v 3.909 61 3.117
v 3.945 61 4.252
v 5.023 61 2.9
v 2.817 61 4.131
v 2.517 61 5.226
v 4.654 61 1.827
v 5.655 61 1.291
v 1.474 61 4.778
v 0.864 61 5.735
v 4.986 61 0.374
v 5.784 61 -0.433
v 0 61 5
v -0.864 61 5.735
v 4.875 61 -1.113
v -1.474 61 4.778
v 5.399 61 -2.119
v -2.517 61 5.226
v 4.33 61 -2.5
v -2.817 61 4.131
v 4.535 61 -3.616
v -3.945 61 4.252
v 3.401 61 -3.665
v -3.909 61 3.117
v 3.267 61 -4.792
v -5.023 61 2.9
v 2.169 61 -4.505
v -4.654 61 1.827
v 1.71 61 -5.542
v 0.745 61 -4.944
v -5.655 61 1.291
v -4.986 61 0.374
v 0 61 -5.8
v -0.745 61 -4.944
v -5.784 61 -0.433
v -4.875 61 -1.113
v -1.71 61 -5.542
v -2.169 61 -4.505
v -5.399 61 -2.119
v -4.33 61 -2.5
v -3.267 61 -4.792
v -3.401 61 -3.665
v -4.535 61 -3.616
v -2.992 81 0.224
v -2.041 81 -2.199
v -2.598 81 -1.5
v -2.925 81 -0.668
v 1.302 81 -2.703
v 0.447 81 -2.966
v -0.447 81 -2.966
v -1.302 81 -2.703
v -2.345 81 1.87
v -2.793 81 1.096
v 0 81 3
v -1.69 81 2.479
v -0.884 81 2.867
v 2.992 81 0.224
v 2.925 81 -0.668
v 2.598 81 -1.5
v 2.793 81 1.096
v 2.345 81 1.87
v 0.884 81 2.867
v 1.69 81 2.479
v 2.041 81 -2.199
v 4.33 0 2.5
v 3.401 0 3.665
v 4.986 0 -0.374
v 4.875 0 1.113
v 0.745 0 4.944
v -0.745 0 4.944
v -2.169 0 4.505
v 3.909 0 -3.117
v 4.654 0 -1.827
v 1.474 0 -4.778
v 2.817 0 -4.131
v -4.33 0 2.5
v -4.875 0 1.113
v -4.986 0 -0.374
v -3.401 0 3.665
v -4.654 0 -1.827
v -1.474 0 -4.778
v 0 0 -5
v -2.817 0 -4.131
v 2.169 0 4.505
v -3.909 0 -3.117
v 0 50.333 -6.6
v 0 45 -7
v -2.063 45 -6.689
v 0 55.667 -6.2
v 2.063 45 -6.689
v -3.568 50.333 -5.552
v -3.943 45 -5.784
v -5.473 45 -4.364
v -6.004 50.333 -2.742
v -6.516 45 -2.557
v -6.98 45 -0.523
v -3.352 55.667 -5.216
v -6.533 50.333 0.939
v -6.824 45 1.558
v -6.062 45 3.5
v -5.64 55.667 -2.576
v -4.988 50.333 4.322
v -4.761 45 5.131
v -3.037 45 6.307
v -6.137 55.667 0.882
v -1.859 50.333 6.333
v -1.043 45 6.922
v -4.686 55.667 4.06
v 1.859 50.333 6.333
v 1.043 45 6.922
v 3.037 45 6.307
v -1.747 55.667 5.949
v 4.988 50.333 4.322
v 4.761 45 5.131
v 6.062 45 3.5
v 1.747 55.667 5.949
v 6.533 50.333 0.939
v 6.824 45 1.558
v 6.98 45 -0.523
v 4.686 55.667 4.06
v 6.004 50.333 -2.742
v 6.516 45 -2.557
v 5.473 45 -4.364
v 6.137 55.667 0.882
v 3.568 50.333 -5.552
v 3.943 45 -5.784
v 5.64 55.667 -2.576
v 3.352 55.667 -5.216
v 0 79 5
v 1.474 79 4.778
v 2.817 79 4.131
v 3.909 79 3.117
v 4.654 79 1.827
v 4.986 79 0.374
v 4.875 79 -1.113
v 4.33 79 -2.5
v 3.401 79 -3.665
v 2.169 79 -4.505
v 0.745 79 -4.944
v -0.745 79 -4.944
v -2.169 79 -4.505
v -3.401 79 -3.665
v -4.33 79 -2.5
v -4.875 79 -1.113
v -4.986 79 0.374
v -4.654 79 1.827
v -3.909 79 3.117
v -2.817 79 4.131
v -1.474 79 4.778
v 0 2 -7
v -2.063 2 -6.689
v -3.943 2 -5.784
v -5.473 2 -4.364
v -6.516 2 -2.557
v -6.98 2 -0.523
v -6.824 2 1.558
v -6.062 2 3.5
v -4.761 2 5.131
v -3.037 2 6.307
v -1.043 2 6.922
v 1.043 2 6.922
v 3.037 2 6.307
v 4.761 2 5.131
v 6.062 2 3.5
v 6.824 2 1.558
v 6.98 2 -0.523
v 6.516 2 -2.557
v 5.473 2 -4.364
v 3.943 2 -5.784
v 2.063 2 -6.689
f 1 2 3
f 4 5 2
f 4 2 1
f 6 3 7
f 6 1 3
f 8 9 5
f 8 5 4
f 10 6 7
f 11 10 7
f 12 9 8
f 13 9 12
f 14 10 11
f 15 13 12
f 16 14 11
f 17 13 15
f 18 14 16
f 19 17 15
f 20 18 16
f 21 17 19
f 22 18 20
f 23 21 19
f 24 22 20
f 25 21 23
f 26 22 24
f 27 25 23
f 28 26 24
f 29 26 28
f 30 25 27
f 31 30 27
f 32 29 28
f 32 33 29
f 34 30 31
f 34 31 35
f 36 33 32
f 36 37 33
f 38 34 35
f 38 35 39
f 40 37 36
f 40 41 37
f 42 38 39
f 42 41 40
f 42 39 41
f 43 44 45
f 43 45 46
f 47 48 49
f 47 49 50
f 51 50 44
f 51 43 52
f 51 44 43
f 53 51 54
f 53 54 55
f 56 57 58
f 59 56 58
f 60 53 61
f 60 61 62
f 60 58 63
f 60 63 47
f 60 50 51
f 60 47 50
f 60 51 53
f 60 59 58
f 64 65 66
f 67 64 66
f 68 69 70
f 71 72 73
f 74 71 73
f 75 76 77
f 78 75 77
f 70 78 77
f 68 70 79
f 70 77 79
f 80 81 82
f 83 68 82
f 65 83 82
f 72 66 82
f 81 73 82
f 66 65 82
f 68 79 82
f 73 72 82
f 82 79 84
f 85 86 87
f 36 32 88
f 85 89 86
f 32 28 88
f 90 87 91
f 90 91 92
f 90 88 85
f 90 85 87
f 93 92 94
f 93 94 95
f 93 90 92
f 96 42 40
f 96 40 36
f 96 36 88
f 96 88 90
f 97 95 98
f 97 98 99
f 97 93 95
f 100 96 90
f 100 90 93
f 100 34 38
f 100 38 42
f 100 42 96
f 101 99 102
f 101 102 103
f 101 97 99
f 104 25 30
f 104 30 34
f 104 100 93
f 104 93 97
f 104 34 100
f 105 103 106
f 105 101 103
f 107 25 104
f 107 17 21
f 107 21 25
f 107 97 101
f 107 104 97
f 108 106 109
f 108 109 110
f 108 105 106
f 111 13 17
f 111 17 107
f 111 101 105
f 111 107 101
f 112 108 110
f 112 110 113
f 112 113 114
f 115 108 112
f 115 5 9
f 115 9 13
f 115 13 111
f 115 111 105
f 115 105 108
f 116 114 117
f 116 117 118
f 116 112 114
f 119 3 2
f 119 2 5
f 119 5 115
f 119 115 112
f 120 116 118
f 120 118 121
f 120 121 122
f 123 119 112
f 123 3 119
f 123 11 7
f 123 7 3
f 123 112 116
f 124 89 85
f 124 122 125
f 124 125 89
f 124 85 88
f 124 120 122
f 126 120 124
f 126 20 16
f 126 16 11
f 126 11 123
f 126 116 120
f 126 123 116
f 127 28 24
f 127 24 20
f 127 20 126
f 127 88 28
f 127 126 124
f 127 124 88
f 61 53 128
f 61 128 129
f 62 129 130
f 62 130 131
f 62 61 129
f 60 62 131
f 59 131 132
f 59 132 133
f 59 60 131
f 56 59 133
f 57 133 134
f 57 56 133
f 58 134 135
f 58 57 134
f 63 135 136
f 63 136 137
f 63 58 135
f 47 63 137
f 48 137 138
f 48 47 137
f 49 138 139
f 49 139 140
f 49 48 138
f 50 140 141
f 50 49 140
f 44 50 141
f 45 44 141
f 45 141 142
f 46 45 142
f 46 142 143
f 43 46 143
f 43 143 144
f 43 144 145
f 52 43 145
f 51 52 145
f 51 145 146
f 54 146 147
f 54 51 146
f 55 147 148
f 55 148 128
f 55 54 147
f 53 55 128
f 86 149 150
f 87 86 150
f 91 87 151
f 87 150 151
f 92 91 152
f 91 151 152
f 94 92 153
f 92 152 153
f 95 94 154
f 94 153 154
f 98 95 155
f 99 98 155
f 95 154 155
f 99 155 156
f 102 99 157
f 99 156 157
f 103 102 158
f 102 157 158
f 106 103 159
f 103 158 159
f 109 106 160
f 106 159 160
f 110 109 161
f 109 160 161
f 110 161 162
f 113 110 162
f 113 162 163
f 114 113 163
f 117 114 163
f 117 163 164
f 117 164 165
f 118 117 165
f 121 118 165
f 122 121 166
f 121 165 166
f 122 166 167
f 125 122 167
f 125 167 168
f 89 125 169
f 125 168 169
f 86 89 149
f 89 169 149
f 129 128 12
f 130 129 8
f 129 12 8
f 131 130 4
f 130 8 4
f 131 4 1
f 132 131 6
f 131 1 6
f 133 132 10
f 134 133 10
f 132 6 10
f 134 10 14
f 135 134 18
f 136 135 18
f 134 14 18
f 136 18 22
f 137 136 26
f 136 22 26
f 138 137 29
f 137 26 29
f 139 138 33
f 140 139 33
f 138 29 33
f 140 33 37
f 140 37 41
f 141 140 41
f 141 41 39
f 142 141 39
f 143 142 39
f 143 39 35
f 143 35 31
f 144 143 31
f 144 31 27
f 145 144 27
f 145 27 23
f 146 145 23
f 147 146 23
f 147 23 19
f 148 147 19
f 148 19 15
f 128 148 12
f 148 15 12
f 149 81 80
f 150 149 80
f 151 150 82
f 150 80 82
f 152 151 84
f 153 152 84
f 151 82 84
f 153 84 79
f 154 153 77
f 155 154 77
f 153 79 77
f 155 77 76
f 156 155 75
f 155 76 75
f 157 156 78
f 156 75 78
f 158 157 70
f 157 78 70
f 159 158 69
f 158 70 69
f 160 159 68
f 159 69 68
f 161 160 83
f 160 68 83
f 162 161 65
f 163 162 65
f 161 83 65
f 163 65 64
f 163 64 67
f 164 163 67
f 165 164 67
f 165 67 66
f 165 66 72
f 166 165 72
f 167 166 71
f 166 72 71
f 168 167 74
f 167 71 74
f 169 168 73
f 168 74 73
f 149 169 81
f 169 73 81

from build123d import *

# Parameters (mm, degrees)
SKETCH2_R           = 7
BOSS_EXTRUDE1_DEPTH = 45
SKETCH3_R           = 7
BOSS_EXTRUDE2_DEPTH = 16
BOSS_EXTRUDE2_TAPER = 4.289
SKETCH4_R           = 5
BOSS_EXTRUDE3_DEPTH = 20
CHAMFER1_SIZE       = 2


with BuildPart() as part:
    # Sketch2 → Boss-Extrude1 (new body)
    with BuildSketch(Plane(origin=(0, 0, 0), x_dir=(1, 0, 0), z_dir=(0, 1, 0))):
        with Locations(Location((0, 0, 0), (0, 0, 90))):
            Circle(SKETCH2_R)
    extrude(amount=BOSS_EXTRUDE1_DEPTH)

    # Sketch3 → Boss-Extrude2 (add)
    with BuildSketch(Plane(origin=(0, 45, 0), x_dir=(1, 0, 0), z_dir=(0, 1, 0))):
        with Locations(Location((0, 0, 0), (0, 0, 90))):
            Circle(SKETCH3_R)
    extrude(amount=BOSS_EXTRUDE2_DEPTH, taper=BOSS_EXTRUDE2_TAPER)

    # Sketch4 → Boss-Extrude3 (add)
    with BuildSketch(Plane(origin=(0, 61, 0), x_dir=(1, 0, 0), z_dir=(0, 1, 0))):
        with Locations(Location((0, 0, 0), (0, 0, 270))):
            Circle(SKETCH4_R)
    extrude(amount=BOSS_EXTRUDE3_DEPTH)

    # Chamfer1
    chamfer1_edges = [part.edges().sort_by_distance(p)[0] for p in [
        (0, 0, 7),
        (0, 81, -5),
    ]]
    chamfer(chamfer1_edges, length=CHAMFER1_SIZE)


solid = part.part
